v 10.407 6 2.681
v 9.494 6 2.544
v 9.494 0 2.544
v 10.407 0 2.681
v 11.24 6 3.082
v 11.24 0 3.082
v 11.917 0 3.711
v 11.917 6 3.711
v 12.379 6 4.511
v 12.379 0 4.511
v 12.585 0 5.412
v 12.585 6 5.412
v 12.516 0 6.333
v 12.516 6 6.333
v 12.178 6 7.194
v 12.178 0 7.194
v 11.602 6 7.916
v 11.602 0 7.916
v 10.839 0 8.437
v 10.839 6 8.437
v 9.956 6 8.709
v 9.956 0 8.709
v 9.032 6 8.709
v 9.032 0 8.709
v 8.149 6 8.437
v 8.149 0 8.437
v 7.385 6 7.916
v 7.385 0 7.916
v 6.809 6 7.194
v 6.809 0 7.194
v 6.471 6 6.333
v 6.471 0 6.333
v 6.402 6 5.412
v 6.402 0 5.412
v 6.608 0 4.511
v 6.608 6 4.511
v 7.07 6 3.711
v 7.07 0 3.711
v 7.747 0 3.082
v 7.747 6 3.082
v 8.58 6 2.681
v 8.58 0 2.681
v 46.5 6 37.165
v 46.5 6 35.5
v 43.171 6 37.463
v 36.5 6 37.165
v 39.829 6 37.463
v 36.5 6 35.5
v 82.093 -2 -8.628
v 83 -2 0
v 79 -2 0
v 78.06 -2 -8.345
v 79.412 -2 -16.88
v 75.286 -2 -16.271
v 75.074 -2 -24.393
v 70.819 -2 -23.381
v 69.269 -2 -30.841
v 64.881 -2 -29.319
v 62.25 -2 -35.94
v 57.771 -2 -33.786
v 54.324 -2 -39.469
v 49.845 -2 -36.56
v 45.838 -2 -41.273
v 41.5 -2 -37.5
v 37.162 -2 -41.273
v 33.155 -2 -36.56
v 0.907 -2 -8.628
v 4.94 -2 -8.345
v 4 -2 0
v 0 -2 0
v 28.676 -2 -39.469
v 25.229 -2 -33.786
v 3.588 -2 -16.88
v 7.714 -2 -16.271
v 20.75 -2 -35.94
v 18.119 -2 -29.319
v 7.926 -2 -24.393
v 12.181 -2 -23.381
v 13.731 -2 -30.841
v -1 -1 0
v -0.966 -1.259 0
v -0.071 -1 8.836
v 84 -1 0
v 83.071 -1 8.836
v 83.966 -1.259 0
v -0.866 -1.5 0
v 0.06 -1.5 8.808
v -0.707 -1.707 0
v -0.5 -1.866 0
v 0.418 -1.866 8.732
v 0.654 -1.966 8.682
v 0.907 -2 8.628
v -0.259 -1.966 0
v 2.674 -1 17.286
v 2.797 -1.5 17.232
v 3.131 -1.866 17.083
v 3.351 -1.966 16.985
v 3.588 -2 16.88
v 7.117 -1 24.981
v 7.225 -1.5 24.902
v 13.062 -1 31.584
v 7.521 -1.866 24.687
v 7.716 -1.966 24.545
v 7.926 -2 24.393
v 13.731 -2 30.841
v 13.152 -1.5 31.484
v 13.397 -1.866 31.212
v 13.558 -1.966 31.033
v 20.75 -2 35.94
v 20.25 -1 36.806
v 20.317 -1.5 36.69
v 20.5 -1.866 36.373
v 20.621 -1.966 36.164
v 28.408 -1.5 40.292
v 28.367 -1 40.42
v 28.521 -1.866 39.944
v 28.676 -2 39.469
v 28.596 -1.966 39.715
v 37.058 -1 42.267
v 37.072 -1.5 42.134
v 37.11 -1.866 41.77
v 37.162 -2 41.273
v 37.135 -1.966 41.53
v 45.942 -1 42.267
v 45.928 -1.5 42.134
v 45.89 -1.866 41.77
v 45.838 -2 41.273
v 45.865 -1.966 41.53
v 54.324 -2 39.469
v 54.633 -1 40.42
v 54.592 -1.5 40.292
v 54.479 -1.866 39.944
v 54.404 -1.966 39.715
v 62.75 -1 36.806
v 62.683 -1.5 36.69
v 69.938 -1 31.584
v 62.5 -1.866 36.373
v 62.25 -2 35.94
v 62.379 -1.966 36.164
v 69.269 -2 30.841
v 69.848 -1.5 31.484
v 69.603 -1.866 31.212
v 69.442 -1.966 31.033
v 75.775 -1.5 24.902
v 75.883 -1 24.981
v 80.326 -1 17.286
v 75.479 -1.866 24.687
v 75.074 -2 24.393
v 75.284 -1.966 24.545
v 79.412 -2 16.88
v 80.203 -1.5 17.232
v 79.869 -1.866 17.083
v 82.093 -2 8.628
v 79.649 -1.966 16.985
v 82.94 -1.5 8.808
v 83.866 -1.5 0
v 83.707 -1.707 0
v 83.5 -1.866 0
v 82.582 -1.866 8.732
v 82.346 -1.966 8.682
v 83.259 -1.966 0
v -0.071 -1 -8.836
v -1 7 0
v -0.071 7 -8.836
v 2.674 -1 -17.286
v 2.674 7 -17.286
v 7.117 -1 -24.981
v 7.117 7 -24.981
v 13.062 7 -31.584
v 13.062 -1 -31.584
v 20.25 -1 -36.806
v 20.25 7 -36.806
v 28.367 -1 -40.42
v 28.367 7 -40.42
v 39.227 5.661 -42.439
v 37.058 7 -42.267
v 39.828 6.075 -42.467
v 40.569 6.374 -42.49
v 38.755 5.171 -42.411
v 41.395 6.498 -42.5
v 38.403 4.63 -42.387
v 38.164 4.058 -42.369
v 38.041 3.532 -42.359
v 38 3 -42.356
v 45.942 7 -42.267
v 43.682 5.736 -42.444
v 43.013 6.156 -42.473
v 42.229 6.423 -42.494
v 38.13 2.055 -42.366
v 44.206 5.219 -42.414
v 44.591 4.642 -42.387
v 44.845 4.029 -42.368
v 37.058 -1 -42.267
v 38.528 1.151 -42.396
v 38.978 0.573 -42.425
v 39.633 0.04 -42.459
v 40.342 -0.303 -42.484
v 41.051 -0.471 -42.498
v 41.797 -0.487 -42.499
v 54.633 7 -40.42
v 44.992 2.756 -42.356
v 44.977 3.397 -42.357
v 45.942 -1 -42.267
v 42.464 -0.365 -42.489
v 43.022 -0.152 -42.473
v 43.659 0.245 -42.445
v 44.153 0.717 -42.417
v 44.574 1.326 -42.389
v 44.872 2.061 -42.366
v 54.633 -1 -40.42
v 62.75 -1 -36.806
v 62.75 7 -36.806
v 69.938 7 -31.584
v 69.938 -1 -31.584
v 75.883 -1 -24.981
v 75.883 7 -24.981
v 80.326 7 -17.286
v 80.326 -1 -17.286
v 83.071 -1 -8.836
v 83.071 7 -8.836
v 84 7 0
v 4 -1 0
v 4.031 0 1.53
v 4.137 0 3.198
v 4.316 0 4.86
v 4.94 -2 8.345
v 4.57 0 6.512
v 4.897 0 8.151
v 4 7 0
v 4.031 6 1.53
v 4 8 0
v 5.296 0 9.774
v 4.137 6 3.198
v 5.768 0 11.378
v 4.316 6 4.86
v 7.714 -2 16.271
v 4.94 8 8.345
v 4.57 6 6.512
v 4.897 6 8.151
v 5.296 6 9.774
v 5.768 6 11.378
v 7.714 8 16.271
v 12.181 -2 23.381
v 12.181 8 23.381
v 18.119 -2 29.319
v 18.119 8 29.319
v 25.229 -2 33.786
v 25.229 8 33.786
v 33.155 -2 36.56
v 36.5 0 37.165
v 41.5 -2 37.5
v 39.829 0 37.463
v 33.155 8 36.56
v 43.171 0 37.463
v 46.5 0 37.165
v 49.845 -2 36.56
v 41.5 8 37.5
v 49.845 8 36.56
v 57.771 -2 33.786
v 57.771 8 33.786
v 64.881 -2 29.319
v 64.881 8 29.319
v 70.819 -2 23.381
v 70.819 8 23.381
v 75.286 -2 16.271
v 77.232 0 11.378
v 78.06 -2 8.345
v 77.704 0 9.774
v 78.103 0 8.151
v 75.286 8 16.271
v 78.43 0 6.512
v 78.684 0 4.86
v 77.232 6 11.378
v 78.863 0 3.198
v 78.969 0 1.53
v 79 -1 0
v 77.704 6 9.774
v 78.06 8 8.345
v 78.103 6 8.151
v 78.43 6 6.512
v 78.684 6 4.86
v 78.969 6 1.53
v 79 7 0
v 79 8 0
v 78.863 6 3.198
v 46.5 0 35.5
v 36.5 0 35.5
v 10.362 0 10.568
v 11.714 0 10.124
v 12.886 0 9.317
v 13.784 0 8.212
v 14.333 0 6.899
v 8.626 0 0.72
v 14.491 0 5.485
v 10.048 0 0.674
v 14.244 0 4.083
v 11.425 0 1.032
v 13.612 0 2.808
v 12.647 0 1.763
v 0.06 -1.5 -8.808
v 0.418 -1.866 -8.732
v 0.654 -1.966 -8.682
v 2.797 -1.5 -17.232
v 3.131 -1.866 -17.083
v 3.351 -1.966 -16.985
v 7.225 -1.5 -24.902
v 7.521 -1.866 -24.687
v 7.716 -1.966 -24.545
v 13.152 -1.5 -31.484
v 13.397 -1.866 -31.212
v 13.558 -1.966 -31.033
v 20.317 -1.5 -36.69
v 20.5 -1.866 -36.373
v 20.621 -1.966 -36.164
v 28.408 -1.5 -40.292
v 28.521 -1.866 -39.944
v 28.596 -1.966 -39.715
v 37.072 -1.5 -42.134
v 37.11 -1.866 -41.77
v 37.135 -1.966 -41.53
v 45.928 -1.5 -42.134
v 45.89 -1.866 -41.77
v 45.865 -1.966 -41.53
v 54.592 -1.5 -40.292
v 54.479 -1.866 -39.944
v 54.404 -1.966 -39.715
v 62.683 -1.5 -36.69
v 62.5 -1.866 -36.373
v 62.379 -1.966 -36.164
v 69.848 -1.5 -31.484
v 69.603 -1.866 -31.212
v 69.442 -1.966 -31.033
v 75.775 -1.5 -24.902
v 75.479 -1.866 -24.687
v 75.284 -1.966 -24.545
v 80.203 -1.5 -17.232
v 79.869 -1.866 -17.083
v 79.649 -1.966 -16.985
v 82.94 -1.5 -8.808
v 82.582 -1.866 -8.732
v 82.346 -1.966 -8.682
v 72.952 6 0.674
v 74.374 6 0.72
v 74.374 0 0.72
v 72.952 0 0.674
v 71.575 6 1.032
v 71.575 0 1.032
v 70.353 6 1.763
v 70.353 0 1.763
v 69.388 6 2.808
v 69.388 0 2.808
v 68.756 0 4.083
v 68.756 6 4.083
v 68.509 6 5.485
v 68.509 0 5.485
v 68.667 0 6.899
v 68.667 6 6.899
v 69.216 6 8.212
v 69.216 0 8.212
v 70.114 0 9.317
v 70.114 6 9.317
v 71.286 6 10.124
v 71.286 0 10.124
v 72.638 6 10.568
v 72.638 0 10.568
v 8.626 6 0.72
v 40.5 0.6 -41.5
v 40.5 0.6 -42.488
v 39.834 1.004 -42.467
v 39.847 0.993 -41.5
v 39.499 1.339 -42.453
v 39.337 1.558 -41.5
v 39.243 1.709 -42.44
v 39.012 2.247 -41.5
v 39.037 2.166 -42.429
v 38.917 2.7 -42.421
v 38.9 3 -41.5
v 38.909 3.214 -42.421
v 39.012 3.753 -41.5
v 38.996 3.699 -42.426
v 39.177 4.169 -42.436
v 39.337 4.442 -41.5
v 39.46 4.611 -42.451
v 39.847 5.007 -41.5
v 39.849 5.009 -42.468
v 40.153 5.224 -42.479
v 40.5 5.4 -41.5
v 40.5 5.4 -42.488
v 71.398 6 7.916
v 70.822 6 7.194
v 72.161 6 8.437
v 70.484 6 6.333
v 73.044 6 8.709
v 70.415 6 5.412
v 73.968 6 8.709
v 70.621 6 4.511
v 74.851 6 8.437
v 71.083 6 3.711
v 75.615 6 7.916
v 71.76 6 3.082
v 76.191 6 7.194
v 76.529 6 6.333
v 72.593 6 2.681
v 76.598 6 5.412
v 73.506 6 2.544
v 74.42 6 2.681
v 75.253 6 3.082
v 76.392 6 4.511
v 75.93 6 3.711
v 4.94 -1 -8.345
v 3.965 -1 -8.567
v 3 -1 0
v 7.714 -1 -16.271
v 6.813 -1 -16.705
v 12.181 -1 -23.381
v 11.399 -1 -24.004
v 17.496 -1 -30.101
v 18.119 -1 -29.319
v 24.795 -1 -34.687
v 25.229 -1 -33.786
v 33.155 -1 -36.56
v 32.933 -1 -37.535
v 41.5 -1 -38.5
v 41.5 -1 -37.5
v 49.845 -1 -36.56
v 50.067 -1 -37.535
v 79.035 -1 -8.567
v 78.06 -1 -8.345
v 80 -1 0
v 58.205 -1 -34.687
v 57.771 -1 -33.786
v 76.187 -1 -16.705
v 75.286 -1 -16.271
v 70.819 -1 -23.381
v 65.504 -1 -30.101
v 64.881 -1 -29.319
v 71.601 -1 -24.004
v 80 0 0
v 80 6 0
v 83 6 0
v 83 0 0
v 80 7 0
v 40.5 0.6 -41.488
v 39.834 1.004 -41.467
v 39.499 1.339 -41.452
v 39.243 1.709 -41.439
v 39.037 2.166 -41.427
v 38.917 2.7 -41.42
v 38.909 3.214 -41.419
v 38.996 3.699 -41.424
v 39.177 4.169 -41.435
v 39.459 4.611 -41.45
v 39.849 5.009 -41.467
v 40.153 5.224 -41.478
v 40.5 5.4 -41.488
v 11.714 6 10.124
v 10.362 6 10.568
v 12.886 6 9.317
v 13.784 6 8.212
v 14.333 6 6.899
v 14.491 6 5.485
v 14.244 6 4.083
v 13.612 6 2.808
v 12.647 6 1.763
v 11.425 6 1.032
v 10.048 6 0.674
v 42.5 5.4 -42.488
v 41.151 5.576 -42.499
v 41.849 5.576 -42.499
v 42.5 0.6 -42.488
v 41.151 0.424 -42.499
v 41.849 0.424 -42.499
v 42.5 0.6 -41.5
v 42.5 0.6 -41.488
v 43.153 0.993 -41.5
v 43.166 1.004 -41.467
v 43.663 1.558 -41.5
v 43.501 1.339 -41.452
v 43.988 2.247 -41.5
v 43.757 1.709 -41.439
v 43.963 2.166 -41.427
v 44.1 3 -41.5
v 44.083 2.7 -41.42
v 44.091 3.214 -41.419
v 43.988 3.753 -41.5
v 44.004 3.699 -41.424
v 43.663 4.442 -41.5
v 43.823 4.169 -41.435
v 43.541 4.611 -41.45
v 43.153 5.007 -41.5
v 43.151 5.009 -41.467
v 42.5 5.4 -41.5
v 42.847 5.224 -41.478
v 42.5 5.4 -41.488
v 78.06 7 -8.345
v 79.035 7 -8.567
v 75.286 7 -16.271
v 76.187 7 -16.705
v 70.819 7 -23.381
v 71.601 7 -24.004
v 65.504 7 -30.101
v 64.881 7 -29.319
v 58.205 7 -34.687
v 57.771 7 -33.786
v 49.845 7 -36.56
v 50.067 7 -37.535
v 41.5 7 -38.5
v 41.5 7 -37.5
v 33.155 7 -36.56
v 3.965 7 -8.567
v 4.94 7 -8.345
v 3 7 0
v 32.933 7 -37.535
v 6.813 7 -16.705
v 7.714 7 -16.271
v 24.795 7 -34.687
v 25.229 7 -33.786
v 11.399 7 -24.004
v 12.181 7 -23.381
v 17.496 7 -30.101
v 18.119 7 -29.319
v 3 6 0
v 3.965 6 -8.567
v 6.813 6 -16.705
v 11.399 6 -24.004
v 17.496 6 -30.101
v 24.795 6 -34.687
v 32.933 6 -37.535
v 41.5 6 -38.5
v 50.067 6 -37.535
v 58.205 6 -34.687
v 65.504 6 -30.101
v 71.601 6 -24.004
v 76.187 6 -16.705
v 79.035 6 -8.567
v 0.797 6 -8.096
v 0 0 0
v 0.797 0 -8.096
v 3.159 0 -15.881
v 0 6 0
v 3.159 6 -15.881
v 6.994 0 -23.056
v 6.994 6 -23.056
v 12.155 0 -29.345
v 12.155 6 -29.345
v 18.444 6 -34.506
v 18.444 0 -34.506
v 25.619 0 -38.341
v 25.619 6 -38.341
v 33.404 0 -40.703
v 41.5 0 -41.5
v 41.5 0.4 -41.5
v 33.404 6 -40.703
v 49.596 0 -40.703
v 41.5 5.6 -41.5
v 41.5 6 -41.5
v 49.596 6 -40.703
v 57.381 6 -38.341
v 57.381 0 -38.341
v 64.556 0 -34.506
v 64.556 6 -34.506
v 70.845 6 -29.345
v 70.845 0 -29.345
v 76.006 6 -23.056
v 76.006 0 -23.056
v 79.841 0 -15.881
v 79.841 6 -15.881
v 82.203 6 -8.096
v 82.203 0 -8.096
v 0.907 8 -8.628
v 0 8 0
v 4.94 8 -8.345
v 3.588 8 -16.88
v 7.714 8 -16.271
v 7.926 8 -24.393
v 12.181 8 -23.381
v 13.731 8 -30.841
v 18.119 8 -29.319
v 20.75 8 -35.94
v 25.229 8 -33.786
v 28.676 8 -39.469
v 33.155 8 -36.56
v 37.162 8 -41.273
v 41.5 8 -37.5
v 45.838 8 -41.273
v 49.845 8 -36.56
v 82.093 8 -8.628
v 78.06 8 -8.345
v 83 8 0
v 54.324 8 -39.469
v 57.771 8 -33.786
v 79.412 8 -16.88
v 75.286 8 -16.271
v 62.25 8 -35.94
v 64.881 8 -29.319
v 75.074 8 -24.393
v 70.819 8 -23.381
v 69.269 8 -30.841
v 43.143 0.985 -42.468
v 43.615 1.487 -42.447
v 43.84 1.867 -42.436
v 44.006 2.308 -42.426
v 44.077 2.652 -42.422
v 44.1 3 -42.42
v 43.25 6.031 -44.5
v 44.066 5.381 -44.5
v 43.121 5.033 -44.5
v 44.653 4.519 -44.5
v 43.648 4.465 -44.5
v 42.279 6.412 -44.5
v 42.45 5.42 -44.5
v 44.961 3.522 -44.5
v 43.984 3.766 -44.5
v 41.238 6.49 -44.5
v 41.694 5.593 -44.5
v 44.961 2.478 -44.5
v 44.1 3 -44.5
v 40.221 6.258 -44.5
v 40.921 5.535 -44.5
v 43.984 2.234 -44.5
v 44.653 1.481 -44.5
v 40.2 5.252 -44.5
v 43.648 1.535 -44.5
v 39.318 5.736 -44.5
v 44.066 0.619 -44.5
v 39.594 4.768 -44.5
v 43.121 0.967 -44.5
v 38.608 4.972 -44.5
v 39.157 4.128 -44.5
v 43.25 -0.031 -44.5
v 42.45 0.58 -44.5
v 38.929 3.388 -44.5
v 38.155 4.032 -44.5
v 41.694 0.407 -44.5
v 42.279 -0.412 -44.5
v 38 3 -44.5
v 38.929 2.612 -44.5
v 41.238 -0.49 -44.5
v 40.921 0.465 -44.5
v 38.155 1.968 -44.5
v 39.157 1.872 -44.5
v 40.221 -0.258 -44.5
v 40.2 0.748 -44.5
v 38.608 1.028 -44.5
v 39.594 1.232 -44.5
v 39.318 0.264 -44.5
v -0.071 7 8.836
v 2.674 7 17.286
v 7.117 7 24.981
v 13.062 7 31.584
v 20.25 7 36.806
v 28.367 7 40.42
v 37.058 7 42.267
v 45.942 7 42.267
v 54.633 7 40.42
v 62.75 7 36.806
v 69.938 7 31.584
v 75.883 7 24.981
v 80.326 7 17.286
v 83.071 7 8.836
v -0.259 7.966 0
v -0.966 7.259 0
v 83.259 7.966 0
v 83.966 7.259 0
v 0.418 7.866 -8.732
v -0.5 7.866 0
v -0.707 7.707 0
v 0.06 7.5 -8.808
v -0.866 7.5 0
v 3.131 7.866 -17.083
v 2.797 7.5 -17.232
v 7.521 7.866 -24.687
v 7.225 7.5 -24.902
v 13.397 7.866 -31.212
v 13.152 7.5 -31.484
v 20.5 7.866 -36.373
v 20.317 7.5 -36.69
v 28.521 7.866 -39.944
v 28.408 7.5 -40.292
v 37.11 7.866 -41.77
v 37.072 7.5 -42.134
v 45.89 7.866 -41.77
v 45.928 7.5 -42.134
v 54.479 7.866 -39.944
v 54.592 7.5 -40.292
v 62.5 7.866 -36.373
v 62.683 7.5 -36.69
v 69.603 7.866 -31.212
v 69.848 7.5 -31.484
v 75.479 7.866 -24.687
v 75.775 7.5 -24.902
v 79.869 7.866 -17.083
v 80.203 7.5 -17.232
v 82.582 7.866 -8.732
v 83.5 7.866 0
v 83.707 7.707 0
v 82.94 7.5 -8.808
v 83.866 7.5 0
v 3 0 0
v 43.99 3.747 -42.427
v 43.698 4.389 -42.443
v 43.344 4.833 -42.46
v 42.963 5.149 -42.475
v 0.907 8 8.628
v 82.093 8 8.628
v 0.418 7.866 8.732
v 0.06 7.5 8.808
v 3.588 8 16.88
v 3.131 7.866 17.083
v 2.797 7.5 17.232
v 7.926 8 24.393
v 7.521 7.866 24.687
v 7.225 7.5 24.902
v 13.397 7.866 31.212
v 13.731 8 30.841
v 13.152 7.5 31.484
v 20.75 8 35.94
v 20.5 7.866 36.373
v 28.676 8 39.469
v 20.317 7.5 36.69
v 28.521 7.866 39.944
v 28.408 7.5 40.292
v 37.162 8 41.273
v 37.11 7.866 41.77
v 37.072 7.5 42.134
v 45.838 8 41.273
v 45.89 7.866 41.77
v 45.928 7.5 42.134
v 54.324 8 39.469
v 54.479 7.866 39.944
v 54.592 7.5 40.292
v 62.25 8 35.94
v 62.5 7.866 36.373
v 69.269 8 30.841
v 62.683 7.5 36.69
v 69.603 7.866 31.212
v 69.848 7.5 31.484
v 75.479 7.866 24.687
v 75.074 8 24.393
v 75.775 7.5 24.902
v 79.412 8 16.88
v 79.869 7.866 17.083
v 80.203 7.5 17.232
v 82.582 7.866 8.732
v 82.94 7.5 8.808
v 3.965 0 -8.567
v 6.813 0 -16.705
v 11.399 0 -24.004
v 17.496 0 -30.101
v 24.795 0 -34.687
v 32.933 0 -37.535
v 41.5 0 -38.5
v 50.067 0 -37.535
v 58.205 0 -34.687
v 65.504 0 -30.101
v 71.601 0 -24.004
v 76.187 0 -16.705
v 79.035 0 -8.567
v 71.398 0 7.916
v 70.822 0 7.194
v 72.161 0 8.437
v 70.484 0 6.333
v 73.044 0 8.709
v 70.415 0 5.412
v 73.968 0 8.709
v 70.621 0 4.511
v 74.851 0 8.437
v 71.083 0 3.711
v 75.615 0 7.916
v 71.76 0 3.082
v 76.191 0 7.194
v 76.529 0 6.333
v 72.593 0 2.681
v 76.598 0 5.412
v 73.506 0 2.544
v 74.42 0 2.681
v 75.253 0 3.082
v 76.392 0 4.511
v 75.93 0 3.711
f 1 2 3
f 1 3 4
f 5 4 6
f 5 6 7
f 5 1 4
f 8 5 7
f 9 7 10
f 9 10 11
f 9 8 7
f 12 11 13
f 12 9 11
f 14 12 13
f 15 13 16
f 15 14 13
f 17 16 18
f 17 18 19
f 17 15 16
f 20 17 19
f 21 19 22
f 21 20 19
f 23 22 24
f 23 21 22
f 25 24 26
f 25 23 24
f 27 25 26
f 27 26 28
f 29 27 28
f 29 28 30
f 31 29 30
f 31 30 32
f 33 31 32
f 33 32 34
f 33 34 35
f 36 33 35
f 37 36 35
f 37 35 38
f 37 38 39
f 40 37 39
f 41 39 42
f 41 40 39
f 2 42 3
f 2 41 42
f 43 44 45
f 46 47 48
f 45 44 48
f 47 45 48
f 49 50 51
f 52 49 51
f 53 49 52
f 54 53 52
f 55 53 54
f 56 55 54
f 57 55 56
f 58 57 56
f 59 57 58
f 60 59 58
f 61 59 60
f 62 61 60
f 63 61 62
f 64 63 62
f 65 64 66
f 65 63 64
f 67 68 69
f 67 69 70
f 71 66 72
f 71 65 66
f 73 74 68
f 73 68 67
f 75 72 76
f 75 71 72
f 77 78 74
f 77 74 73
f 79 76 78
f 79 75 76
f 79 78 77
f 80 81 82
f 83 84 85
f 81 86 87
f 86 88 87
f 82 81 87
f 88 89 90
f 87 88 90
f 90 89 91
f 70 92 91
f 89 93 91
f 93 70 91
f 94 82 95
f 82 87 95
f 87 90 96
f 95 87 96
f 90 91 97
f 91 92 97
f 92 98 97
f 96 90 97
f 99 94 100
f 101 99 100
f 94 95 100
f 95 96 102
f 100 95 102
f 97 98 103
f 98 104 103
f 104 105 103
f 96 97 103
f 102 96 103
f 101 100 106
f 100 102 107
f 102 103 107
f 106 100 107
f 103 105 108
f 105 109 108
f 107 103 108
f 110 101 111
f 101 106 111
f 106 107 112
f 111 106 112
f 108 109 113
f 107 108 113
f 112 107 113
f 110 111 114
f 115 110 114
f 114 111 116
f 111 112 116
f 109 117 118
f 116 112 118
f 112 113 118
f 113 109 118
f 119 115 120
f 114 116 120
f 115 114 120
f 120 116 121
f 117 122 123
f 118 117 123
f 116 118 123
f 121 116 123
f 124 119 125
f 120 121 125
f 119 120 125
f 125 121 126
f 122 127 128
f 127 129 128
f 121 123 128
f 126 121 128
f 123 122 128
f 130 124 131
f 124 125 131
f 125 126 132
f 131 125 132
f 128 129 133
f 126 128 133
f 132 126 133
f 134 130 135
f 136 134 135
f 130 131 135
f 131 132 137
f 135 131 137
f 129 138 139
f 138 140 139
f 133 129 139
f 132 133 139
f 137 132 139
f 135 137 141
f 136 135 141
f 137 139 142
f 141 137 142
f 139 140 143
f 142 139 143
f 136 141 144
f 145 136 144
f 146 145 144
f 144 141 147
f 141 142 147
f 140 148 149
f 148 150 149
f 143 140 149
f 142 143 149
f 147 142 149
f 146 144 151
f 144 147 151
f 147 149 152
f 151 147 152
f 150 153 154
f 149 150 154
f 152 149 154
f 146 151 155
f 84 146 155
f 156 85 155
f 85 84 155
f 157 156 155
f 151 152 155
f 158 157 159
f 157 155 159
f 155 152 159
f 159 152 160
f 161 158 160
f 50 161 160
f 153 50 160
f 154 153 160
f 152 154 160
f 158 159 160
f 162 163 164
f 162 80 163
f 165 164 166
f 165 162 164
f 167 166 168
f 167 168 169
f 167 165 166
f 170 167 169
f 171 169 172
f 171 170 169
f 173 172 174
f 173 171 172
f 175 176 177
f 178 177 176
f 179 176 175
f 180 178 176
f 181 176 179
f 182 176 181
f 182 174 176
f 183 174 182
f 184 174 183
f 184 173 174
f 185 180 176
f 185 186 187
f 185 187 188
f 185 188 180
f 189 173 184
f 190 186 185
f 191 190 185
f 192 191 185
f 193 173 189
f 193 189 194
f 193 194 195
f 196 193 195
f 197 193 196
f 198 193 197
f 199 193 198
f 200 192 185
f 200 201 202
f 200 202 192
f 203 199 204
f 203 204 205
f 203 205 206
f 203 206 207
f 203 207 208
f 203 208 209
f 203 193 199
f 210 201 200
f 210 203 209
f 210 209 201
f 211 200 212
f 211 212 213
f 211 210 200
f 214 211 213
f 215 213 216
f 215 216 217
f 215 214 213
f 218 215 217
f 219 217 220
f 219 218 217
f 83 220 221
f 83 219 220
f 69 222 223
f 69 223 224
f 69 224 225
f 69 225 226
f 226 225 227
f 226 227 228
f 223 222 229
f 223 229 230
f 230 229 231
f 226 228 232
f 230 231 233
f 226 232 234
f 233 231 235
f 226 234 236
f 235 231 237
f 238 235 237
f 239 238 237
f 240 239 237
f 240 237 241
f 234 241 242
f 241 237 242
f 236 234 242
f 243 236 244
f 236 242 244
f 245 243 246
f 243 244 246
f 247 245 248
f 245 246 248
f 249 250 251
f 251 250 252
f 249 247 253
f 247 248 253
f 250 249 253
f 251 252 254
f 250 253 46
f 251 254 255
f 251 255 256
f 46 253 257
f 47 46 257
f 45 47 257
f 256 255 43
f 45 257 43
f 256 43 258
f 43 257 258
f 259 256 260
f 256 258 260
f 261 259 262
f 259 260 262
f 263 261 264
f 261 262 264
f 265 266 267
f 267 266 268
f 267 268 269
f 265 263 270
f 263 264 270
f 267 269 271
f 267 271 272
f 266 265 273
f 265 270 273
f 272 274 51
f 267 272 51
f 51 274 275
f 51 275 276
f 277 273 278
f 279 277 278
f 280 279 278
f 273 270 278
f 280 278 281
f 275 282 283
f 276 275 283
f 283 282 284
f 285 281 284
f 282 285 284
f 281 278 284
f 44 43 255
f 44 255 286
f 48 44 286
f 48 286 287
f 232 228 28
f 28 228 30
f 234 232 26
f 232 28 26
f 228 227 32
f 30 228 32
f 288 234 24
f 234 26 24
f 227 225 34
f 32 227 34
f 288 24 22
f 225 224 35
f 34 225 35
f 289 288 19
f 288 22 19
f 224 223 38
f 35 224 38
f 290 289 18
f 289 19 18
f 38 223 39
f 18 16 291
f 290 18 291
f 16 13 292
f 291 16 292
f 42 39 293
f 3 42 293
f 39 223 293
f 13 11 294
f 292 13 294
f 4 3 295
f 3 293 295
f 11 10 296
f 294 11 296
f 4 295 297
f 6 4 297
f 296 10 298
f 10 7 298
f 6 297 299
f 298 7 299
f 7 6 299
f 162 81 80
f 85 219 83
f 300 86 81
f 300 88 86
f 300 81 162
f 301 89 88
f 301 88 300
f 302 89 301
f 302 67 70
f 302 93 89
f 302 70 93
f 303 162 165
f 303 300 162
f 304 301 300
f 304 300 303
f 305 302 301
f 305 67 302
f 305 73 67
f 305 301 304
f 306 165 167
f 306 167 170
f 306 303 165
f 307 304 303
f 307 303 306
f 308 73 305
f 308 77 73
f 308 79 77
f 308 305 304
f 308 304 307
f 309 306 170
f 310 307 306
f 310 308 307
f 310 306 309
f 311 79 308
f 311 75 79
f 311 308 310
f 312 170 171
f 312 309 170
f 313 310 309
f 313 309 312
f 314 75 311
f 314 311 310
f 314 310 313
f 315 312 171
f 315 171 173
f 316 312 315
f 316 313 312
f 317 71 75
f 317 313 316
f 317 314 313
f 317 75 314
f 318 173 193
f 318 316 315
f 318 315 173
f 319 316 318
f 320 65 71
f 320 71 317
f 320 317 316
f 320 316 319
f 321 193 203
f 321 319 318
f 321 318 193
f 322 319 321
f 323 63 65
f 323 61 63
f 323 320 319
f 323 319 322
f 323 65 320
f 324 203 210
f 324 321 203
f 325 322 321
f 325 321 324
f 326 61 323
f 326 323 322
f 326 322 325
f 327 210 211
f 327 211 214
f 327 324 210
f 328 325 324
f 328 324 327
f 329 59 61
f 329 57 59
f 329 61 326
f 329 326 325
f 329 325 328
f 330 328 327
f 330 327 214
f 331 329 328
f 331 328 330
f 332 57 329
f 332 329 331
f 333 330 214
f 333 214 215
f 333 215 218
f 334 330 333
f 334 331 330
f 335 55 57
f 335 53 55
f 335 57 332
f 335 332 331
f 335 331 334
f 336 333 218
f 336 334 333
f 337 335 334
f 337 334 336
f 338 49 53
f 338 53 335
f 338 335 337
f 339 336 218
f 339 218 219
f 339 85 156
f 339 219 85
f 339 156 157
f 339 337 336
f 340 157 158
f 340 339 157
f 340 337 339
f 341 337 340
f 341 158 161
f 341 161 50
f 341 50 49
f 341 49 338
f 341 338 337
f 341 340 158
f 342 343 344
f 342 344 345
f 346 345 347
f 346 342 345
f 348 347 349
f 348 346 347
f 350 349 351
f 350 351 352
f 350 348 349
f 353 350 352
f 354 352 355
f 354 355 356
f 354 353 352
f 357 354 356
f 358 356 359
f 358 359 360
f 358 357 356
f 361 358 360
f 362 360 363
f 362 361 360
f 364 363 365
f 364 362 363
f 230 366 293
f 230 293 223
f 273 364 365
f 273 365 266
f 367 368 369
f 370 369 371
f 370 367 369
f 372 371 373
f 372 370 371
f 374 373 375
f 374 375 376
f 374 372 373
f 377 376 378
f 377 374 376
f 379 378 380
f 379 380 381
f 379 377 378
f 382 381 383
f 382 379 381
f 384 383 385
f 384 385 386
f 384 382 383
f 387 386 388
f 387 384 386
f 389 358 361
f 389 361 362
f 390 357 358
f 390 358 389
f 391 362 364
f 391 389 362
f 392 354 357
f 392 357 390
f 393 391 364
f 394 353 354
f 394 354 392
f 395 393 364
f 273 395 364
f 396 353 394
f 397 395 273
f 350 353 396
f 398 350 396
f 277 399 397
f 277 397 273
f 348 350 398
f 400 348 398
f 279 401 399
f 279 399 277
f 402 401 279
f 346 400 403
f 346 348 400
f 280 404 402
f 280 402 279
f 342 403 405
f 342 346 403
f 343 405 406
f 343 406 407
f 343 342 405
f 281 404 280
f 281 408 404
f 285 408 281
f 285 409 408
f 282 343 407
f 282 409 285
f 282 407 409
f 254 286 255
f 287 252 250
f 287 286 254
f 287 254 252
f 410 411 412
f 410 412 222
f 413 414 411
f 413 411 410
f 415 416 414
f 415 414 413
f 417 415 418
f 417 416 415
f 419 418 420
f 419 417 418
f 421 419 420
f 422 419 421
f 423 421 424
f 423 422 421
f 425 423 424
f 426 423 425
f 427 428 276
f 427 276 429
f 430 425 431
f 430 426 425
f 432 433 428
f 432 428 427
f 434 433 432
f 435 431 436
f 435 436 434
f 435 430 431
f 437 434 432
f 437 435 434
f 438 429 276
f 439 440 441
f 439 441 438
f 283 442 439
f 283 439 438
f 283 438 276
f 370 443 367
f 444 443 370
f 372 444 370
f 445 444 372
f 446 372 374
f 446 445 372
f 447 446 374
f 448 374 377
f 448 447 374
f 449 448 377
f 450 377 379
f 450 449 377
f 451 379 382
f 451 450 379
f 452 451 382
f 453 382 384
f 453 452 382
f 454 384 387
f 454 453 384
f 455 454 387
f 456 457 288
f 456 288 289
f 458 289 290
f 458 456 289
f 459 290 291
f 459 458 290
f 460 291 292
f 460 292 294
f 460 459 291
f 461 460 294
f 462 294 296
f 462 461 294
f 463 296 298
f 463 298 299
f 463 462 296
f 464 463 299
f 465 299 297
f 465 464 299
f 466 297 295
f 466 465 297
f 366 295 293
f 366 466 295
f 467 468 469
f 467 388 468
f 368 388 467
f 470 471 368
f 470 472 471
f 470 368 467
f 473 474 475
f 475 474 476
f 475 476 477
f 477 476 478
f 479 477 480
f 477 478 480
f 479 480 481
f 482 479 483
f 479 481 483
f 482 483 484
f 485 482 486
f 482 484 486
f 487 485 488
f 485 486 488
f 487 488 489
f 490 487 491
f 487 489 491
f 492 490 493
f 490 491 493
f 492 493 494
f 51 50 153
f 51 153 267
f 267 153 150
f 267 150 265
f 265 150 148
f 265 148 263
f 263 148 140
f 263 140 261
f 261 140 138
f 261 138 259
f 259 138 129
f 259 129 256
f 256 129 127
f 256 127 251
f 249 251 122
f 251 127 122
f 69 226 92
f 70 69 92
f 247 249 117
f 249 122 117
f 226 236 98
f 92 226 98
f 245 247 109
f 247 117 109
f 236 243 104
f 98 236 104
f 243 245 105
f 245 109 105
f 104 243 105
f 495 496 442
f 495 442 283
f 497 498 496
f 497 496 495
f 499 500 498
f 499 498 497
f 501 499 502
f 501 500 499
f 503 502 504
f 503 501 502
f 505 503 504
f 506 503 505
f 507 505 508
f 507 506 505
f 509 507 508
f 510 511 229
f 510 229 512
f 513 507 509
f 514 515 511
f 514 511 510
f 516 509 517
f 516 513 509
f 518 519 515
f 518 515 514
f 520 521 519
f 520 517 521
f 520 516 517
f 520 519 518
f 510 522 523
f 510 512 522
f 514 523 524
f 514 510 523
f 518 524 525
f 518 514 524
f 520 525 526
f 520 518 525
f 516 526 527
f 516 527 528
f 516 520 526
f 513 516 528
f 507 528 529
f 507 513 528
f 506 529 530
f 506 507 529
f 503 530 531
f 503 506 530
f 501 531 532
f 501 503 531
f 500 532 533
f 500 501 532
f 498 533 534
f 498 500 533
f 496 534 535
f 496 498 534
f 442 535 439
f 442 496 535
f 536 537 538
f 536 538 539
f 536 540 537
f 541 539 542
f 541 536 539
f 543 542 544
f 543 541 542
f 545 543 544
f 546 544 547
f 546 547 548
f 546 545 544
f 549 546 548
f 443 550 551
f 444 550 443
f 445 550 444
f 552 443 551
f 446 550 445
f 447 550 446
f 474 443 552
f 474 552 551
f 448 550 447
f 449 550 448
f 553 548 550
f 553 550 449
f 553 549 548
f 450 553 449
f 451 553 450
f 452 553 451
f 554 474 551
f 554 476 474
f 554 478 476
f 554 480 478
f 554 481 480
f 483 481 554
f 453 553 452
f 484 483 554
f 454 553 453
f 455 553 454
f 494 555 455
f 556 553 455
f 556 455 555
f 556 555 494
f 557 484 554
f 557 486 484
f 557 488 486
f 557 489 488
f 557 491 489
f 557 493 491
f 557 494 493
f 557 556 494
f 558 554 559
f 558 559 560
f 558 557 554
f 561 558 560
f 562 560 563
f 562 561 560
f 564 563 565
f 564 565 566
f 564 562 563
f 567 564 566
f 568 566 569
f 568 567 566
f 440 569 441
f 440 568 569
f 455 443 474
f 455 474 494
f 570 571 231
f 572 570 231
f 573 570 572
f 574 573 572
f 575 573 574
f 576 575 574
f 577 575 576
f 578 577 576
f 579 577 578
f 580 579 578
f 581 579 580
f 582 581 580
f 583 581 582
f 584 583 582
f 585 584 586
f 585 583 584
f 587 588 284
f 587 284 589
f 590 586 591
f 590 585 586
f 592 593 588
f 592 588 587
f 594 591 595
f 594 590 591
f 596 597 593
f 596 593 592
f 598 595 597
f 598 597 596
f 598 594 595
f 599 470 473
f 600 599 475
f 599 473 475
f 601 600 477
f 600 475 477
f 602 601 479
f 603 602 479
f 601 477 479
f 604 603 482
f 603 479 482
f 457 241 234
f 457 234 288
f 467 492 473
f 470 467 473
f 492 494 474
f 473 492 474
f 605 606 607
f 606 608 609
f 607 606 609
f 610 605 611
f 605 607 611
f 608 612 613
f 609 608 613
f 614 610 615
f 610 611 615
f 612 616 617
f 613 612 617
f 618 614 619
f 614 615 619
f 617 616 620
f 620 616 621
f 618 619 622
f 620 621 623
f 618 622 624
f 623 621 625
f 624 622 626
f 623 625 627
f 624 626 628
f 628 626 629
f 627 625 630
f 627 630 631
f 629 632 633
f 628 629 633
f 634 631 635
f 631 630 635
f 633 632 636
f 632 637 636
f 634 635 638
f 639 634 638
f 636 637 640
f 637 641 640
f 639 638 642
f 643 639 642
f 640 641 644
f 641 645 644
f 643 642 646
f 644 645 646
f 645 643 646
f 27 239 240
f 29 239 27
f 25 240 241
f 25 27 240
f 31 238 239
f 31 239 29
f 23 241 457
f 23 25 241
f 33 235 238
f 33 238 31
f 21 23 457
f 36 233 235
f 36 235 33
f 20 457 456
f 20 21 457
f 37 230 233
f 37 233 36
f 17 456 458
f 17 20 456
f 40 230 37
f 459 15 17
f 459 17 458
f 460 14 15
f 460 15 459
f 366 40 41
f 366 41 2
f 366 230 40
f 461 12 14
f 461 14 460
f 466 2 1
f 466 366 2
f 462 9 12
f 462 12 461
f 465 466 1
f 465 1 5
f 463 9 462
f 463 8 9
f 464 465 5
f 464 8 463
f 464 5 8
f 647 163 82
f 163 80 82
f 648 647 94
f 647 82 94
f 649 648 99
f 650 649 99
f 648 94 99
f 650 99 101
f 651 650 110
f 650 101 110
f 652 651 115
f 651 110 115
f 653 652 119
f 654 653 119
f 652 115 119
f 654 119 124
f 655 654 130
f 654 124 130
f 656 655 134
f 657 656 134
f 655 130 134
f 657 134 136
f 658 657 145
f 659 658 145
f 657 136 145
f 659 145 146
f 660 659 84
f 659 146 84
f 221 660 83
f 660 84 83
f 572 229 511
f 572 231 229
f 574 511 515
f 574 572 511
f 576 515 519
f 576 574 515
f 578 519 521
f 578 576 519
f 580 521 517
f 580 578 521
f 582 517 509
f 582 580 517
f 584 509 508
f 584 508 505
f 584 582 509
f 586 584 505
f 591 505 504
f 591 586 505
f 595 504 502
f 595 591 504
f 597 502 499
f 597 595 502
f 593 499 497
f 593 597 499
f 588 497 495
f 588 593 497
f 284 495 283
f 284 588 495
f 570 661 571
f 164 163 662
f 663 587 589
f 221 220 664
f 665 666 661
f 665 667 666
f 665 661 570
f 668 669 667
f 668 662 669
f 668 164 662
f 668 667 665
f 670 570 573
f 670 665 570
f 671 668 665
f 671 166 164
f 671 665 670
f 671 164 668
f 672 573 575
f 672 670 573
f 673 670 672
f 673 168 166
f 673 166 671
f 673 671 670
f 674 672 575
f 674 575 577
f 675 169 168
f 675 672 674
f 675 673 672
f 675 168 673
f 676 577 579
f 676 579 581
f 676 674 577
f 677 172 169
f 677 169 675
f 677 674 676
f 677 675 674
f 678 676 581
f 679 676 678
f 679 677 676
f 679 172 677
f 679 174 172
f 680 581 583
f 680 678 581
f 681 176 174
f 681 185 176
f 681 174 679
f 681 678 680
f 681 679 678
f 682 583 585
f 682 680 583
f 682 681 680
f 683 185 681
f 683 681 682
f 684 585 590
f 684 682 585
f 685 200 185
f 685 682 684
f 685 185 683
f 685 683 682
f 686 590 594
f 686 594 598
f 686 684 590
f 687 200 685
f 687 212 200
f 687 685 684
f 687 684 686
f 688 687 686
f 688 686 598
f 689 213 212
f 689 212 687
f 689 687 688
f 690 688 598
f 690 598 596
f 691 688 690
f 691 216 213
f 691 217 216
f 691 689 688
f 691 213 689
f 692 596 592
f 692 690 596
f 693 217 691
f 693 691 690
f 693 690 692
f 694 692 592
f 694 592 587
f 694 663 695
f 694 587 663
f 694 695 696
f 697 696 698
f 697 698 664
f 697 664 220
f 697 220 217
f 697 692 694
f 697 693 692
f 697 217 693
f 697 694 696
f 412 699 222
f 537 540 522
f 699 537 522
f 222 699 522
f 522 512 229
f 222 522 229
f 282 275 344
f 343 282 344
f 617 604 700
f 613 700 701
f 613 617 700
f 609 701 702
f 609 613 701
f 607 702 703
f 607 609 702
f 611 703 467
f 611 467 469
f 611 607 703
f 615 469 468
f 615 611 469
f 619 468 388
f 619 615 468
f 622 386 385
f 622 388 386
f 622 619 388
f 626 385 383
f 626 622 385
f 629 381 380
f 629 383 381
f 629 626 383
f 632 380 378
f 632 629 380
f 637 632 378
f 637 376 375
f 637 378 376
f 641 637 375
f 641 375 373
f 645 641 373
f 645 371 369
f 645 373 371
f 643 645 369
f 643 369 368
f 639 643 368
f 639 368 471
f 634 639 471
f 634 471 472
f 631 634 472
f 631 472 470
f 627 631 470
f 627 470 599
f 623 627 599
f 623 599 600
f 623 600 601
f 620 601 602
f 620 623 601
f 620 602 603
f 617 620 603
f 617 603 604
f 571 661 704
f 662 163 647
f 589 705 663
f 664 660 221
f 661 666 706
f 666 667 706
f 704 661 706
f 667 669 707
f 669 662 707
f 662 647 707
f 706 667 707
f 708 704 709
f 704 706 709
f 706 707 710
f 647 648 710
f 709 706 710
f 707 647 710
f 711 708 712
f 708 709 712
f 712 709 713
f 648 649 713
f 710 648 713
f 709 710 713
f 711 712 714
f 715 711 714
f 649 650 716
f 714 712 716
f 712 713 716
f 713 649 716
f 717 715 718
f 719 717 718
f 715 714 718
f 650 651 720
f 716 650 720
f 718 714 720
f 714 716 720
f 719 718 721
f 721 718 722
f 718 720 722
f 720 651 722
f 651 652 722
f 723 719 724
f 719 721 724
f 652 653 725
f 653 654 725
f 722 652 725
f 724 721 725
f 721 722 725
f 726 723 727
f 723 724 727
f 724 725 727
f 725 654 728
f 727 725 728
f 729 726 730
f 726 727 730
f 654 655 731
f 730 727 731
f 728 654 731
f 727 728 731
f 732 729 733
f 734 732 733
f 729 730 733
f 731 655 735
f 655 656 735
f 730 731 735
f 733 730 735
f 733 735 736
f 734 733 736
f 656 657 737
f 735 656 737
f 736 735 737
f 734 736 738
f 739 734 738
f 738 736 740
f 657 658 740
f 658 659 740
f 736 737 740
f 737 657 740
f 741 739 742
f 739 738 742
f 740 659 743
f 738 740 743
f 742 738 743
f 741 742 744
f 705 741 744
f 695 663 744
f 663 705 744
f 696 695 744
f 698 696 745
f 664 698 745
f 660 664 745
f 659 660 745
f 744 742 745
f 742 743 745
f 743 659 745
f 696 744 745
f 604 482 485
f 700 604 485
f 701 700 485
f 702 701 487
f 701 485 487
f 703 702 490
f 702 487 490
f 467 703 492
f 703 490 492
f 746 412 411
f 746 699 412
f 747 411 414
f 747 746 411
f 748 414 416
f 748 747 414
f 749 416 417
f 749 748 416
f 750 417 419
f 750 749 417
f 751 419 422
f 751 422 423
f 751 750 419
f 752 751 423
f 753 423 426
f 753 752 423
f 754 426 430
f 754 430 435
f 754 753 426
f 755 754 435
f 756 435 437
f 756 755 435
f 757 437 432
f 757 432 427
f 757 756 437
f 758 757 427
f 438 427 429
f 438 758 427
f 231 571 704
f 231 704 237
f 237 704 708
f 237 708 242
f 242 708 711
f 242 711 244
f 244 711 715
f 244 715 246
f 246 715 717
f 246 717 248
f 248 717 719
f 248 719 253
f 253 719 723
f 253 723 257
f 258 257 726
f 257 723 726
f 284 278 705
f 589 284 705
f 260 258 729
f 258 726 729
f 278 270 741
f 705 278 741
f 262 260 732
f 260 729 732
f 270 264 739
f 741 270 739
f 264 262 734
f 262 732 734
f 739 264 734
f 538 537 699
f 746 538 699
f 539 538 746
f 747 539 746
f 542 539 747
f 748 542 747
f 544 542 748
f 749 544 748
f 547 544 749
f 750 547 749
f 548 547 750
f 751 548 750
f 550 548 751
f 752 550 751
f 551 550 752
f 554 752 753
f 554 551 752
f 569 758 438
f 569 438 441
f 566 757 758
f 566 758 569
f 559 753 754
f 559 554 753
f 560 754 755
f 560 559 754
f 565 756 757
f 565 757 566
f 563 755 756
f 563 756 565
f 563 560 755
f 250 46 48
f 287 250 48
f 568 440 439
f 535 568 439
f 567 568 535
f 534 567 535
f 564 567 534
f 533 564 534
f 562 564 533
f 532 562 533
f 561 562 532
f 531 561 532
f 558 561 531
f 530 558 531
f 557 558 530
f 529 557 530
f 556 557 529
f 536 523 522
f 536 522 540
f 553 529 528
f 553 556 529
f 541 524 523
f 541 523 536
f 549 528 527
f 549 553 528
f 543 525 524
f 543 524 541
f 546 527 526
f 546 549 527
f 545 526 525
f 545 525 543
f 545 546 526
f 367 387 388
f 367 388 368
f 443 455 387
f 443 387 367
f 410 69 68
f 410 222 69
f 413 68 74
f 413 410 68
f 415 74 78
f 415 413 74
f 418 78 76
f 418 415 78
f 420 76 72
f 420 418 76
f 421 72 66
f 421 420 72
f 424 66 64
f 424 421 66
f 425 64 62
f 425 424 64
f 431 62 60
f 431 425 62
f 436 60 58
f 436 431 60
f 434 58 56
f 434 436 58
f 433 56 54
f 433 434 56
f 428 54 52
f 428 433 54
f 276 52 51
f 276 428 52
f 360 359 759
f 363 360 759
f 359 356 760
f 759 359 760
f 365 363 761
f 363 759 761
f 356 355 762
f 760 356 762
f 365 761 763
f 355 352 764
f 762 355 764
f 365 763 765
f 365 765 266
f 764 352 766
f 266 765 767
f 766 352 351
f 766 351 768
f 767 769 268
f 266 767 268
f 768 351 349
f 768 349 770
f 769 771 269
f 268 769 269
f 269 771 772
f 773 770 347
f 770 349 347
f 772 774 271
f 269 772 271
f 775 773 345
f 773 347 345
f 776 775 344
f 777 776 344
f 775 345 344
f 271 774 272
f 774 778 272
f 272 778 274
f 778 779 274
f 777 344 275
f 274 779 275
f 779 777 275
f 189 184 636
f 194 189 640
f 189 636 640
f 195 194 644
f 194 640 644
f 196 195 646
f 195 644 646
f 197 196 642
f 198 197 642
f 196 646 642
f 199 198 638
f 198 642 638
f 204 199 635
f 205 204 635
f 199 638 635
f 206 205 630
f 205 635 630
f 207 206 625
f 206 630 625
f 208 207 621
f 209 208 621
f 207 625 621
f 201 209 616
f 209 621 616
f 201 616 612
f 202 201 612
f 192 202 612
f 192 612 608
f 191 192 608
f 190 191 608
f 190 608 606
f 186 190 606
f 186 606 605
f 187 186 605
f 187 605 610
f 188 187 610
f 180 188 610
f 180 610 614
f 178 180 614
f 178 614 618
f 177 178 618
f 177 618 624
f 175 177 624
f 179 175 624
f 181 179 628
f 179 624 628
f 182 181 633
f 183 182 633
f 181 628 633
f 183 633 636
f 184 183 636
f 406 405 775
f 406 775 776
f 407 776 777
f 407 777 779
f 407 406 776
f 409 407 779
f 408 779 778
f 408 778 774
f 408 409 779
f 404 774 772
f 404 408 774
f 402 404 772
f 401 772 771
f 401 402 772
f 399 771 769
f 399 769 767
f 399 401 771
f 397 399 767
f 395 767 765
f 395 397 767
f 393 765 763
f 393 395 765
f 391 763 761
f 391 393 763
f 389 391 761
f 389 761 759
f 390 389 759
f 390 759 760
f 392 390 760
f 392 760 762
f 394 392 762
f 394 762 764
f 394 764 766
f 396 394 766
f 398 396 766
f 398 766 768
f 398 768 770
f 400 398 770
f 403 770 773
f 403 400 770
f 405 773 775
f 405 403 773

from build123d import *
from build123d.topology import SkipClean

# Parameters (mm, degrees)
REVOLVE_1_ANGLE      = 180
REVOLVE_2_ANGLE      = 180
EXTRUDE_5_DEPTH      = 3
EXTRUDE_5_DEPTH_BACK = 3
SKETCH_4_R           = 3.1
SKETCH_4_W           = 10
SKETCH_4_H           = 4
CUT_EXTRUDE_1_DEPTH  = 95.478833653
EXTRUDE_6_DEPTH      = 1
EXTRUDE_6_DEPTH_BACK = 2
SKETCH_6_R           = 3.5
SKETCH_6_R_2         = 2.6


with BuildPart() as part:
    # 草图1 → 旋转1 (revolve)
    with BuildSketch(Plane.XY):
        with BuildLine():
            Line((3, 6), (3, 7))
            Line((3, 7), (4, 7))
            Line((4, 7), (4, 8))
            Line((4, 8), (1.5, 8))
            Line((1.5, 8), (0, 8))
            ThreePointArc((0, 8), (-0.707106781, 7.707106781), (-1, 7))
            Line((-1, 7), (-1, -1))
            ThreePointArc((-1, -1), (-0.707106781, -1.707106781), (0, -2))
            Line((0, -2), (1.5, -2))
            Line((1.5, -2), (4, -2))
            Line((4, -2), (4, -1))
            Line((4, -1), (3, -1))
            Line((3, -1), (3, 0))
            Line((3, 0), (0, 0))
            Line((0, 0), (0, 6))
            Line((0, 6), (3, 6))
        make_face()
    revolve(axis=Axis((41.5, 14.191636994, 0), (0, -1, 0)), revolution_arc=REVOLVE_1_ANGLE)

    # 草图2 → 旋转2 (revolve)
    with SkipClean():  # the faces are left unmerged after this step: merging them gives an invalid solid
        with BuildSketch(Plane.XY):
            with BuildLine():
                Line((0, -2), (4, -2))
                Line((4, -2), (4, 8))
                Line((4, 8), (0, 8))
                ThreePointArc((0, 8), (-0.707106781, 7.707106781), (-1, 7))
                Line((-1, 7), (-1, -1))
                ThreePointArc((-1, -1), (-0.707106781, -1.707106781), (0, -2))
            make_face()
        revolve(axis=Axis((41.5, 14.191636994, 0), (0, 1, 0)), revolution_arc=REVOLVE_2_ANGLE)

    # 草图4 → 凸台-拉伸5 (add, two sides: drawn at the far end of the back side and taken through both)
    # profile 1 of 3: a face of its own
    with SkipClean():  # the faces are left unmerged after this step: merging them gives an invalid solid
        with BuildSketch(Plane(origin=(0, 3, 0), x_dir=(-1, 0, 0), z_dir=(0, -1, 0)).offset(-EXTRUDE_5_DEPTH_BACK)):
            with BuildLine():
                Line((-3.701468374, -1.587767897), (-5.43795015, -11.435845428))
                Line((-5.43795015, -11.435845428), (-10.361988915, -10.567604539))
                ThreePointArc((-10.361988915, -10.567604539), (-14.417786792, -4.775324886), (-8.625507139, -0.719527009))
                Line((-8.625507139, -0.719527009), (-3.701468374, -1.587767897))
            make_face()
            with Locations((-9.493748027, -5.643565774)):
                Circle(SKETCH_4_R, mode=Mode.SUBTRACT)
        # profile 2 of 3: a face of its own
        with BuildSketch(Plane(origin=(0, 3, 0), x_dir=(-1, 0, 0), z_dir=(0, -1, 0)).offset(-EXTRUDE_5_DEPTH_BACK)):
            with BuildLine():
                Line((-77.56204985, -11.435845428), (-79.298531626, -1.587767897))
                Line((-79.298531626, -1.587767897), (-74.374492861, -0.719527009))
                ThreePointArc((-74.374492861, -0.719527009), (-68.582213208, -4.775324886), (-72.638011085, -10.567604539))
                Line((-72.638011085, -10.567604539), (-77.56204985, -11.435845428))
            make_face()
            with Locations((-73.506251973, -5.643565774)):
                Circle(SKETCH_4_R, mode=Mode.SUBTRACT)
        # profile 3 of 3: a face of its own
        with BuildSketch(Plane(origin=(0, 3, 0), x_dir=(-1, 0, 0), z_dir=(0, -1, 0)).offset(-EXTRUDE_5_DEPTH_BACK)):
            with Locations((-41.5, -37.5)):
                Rectangle(SKETCH_4_W, SKETCH_4_H)
        extrude(amount=EXTRUDE_5_DEPTH + EXTRUDE_5_DEPTH_BACK)

    # 草图5 → 切除-拉伸1 (cut, through all)
    with SkipClean():  # the faces are left unmerged after this step: merging them gives an invalid solid
        with BuildSketch(Plane.XY):
            with BuildLine():
                Line((40.5, 5.4), (40.5, 0.6))
                ThreePointArc((40.5, 0.6), (38.9, 3), (40.5, 5.4))
            make_face()
            with BuildLine():
                Line((42.5, 5.4), (42.5, 0.6))
                ThreePointArc((42.5, 0.6), (44.1, 3), (42.5, 5.4))
            make_face()
        extrude(amount=-CUT_EXTRUDE_1_DEPTH, mode=Mode.SUBTRACT)

    # 草图6 → 凸台-拉伸6 (add, two sides: drawn at the far end of the back side and taken through both)
    with SkipClean():  # the faces are left unmerged after this step: merging them gives an invalid solid
        with BuildSketch(Plane.XY.offset(-42.5).offset(-EXTRUDE_6_DEPTH_BACK)):
            with Locations((41.5, 3)):
                Circle(SKETCH_6_R)
            with Locations((41.5, 3)):
                Circle(SKETCH_6_R_2, mode=Mode.SUBTRACT)
        extrude(amount=EXTRUDE_6_DEPTH + EXTRUDE_6_DEPTH_BACK)


solid = part.part
